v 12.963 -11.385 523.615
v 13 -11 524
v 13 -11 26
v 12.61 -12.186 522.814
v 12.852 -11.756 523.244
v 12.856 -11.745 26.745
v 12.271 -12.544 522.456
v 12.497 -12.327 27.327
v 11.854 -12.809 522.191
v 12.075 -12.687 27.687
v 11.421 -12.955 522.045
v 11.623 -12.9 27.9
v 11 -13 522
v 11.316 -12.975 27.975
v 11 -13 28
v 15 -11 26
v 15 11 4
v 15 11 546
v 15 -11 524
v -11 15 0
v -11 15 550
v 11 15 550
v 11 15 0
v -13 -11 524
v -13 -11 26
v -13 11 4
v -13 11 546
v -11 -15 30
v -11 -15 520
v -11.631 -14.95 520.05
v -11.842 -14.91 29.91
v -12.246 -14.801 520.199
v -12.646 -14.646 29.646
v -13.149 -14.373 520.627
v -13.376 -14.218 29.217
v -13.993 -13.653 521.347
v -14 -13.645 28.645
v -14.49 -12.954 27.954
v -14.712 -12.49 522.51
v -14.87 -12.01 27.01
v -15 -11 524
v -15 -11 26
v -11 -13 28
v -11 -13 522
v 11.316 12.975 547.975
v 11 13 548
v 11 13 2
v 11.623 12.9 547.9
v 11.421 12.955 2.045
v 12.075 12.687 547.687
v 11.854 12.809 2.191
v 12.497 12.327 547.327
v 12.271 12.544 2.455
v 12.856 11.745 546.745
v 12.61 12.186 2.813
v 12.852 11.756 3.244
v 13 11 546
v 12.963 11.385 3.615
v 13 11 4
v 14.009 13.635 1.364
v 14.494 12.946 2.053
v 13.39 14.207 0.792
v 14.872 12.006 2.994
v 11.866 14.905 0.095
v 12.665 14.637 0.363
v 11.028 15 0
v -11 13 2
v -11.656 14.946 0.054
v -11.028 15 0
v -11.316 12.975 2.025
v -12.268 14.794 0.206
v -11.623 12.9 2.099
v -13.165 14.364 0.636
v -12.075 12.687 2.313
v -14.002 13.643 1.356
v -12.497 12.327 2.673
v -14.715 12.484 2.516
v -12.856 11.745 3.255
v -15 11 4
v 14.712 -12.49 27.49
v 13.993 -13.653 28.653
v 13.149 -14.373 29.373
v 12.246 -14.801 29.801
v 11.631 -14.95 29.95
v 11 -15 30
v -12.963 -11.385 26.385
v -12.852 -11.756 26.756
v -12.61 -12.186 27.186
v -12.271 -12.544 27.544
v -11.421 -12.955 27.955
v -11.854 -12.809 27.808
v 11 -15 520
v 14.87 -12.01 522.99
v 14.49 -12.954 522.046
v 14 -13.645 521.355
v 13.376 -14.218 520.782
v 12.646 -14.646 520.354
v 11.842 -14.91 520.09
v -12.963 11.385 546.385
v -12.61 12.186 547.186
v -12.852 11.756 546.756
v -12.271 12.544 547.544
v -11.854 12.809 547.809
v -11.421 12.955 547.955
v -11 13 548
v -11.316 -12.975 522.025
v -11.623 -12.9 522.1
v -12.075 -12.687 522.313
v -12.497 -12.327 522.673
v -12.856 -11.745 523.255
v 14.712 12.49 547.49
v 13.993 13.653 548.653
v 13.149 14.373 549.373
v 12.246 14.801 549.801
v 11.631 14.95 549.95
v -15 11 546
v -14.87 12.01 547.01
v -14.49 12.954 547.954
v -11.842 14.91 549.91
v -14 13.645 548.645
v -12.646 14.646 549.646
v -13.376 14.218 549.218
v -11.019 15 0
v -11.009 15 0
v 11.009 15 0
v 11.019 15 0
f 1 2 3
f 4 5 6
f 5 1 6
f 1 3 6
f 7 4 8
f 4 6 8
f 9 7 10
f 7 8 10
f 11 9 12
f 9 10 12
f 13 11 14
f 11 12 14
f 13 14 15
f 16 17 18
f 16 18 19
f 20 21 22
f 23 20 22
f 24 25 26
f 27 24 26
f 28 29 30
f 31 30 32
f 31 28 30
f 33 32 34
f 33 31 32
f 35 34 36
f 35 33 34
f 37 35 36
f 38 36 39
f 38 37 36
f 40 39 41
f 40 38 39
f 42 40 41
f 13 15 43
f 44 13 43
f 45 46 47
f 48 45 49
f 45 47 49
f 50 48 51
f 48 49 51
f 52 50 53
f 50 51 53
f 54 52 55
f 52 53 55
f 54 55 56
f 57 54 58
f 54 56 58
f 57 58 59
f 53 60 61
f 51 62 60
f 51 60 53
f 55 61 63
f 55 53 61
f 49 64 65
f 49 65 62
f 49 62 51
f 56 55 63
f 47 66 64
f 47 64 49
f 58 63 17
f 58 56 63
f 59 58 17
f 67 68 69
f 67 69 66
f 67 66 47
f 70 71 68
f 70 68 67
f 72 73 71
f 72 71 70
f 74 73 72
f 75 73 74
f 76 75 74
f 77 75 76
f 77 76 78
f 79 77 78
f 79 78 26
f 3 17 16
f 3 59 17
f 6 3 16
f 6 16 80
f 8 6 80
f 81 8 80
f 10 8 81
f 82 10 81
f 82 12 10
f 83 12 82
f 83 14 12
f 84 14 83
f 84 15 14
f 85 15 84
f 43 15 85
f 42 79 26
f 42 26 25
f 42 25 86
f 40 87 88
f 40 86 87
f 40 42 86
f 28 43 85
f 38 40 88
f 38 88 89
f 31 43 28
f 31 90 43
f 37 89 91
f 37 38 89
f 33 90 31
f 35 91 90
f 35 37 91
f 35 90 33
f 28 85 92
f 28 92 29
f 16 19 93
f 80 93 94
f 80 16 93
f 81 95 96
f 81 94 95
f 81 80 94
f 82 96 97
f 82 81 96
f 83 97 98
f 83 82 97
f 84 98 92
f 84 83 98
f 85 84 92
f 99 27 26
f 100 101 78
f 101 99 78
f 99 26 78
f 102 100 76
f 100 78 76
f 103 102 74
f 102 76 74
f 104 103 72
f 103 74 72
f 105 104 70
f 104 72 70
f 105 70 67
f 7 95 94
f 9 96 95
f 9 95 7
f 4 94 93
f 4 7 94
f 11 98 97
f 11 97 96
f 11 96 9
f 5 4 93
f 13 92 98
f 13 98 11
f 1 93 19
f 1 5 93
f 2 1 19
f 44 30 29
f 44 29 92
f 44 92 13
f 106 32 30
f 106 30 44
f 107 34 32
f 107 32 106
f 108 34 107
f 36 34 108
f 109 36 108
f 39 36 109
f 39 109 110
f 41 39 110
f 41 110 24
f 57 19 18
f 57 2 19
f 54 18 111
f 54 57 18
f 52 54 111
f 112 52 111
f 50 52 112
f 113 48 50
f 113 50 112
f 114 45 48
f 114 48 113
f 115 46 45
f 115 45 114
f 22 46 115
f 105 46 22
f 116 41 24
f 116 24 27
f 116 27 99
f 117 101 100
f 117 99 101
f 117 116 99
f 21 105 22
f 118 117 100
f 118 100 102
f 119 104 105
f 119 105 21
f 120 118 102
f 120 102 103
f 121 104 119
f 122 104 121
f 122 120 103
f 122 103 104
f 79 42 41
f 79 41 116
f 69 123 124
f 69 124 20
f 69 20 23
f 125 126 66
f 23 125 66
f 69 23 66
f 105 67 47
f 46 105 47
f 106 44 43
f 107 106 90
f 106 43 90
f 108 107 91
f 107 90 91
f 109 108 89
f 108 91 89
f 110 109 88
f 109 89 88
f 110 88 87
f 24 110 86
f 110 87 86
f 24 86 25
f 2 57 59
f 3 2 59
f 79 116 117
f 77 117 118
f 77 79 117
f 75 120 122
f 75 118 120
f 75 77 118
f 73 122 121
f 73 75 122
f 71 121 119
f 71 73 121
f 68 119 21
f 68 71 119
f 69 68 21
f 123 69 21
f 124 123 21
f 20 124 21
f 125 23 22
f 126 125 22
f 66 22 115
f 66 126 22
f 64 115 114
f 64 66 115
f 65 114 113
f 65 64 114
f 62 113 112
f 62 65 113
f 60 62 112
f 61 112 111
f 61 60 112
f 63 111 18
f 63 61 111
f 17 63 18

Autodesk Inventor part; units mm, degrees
ref_plane "Plano inicial" through (0, 0, 0) normal (0, 0, 1) x (1, 0, 0)
ref_plane "Plano final" through (0, 0, 550) normal (0, 0, 1) x (1, 0, 0)
sketch "Esboço" plane through (0, 0, 0) normal (0, 0, 1) x (1, 0, 0)
  line L0 (-15, -11) -> (-15, 11)
  line L1 (-11, 15) -> (11, 15)
  line L2 (15, 11) -> (15, -11)
  line L3 (11, -15) -> (-11, -15)
  arc A0 (-15, -11) -> (-11, -15) centre (-11, -11) ccw
  arc A1 (15, 11) -> (11, 15) centre (11, 11) ccw
  arc A2 (-11, 15) -> (-15, 11) centre (-11, 11) ccw
  arc A3 (11, -15) -> (15, -11) centre (11, -11) ccw
  arc A4 (-11, 13) -> (-13, 11) centre (-11, 11) ccw
  line L4 (-11, 13) -> (11, 13)
  arc A5 (13, 11) -> (11, 13) centre (11, 11) ccw
  line L5 (13, 11) -> (13, -11)
  arc A6 (11, -13) -> (13, -11) centre (11, -11) ccw
  line L6 (11, -13) -> (-11, -13)
  arc A7 (-13, -11) -> (-11, -13) centre (-11, -11) ccw
  line L7 (-13, -11) -> (-13, 11)
  line L8 (0, 22.1598) -> (0, -22.1598) construction
  line L9 (-22.1598, 0) -> (22.1598, 0) construction
  dimension "d7" = 4
  dimension "d9" = 30
  dimension "d11" = 30
  dimension "d12" = 2
  dimension "d15" = 15
  dimension "d16" = 15
extrude "Corpo" add sketch "Esboço" along normal up to surface (550 mm away) from surface at 0
sketch "Sketch3" plane through (0, 0, 0) normal (0, 0, 1) x (1, 0, 0)
  line L0 (0, 0) -> (10, 0)
ref_plane "Work Plane3" through (0, 0, 0) normal (0, -1, 0) x (1, 0, 0)
sketch "Sketch4" plane through (0, 0, 0) normal (0, -1, 0) x (1, 0, 0)
  line L0 (-2, 0) -> (12, 0)
  line L1 (-2, 550) -> (12, 550)
  dimension "d18" = 550
ref_plane "Plano de trabalho6" through (15, 0, 0) normal (0, 0, -1) x (-1, 0, 0)
split "Dividir3" plane through (15, 0, 0) removes the side toward (0, 0, -1)
ref_plane "Plano de trabalho7" through (105, 0, 550) normal (0, 0, 1) x (1, 0, 0)
split "Dividir4" plane through (105, 0, 550) removes the side toward (0, 0, 1)
ref_plane "Plano de trabalho8" through (0, 15, 550) normal (0, -0.7071, 0.7071) x (1, 0, 0)
split "Dividir5" plane through (0, 15, 550) removes the side toward (0, -0.7071, 0.7071)
ref_plane "Plano de trabalho9" through (0, 15, -0.0001) normal (0, -0.7071, -0.7071) x (1, 0, 0)
split "Dividir6" plane through (0, 15, -0.0001) removes the side toward (0, -0.7071, -0.7071)
equation "\"d7\" = G_IR"
equation "\"d9\" = G_W"
equation "\"d11\" = G_H"
equation "\"d12\" = G_T"
equation "\"d15\" = 0.5 * d9"
equation "\"d16\" = 0.5 * d11"
equation "\"d3\" = G_L"
equation "\"G_W\" = 30"
equation "\"G_H\" = 30"
equation "\"G_T\" = 2"
equation "\"G_IR\" = 4"
equation "\"G_L\" = d18"
equation "\"G_OFFSET_START\" = 0"
equation "\"G_OFFSET_END\" = 0"
properties part number "ISO 10799-2 - 30x30x2 - 550" material "Aço, suave"
